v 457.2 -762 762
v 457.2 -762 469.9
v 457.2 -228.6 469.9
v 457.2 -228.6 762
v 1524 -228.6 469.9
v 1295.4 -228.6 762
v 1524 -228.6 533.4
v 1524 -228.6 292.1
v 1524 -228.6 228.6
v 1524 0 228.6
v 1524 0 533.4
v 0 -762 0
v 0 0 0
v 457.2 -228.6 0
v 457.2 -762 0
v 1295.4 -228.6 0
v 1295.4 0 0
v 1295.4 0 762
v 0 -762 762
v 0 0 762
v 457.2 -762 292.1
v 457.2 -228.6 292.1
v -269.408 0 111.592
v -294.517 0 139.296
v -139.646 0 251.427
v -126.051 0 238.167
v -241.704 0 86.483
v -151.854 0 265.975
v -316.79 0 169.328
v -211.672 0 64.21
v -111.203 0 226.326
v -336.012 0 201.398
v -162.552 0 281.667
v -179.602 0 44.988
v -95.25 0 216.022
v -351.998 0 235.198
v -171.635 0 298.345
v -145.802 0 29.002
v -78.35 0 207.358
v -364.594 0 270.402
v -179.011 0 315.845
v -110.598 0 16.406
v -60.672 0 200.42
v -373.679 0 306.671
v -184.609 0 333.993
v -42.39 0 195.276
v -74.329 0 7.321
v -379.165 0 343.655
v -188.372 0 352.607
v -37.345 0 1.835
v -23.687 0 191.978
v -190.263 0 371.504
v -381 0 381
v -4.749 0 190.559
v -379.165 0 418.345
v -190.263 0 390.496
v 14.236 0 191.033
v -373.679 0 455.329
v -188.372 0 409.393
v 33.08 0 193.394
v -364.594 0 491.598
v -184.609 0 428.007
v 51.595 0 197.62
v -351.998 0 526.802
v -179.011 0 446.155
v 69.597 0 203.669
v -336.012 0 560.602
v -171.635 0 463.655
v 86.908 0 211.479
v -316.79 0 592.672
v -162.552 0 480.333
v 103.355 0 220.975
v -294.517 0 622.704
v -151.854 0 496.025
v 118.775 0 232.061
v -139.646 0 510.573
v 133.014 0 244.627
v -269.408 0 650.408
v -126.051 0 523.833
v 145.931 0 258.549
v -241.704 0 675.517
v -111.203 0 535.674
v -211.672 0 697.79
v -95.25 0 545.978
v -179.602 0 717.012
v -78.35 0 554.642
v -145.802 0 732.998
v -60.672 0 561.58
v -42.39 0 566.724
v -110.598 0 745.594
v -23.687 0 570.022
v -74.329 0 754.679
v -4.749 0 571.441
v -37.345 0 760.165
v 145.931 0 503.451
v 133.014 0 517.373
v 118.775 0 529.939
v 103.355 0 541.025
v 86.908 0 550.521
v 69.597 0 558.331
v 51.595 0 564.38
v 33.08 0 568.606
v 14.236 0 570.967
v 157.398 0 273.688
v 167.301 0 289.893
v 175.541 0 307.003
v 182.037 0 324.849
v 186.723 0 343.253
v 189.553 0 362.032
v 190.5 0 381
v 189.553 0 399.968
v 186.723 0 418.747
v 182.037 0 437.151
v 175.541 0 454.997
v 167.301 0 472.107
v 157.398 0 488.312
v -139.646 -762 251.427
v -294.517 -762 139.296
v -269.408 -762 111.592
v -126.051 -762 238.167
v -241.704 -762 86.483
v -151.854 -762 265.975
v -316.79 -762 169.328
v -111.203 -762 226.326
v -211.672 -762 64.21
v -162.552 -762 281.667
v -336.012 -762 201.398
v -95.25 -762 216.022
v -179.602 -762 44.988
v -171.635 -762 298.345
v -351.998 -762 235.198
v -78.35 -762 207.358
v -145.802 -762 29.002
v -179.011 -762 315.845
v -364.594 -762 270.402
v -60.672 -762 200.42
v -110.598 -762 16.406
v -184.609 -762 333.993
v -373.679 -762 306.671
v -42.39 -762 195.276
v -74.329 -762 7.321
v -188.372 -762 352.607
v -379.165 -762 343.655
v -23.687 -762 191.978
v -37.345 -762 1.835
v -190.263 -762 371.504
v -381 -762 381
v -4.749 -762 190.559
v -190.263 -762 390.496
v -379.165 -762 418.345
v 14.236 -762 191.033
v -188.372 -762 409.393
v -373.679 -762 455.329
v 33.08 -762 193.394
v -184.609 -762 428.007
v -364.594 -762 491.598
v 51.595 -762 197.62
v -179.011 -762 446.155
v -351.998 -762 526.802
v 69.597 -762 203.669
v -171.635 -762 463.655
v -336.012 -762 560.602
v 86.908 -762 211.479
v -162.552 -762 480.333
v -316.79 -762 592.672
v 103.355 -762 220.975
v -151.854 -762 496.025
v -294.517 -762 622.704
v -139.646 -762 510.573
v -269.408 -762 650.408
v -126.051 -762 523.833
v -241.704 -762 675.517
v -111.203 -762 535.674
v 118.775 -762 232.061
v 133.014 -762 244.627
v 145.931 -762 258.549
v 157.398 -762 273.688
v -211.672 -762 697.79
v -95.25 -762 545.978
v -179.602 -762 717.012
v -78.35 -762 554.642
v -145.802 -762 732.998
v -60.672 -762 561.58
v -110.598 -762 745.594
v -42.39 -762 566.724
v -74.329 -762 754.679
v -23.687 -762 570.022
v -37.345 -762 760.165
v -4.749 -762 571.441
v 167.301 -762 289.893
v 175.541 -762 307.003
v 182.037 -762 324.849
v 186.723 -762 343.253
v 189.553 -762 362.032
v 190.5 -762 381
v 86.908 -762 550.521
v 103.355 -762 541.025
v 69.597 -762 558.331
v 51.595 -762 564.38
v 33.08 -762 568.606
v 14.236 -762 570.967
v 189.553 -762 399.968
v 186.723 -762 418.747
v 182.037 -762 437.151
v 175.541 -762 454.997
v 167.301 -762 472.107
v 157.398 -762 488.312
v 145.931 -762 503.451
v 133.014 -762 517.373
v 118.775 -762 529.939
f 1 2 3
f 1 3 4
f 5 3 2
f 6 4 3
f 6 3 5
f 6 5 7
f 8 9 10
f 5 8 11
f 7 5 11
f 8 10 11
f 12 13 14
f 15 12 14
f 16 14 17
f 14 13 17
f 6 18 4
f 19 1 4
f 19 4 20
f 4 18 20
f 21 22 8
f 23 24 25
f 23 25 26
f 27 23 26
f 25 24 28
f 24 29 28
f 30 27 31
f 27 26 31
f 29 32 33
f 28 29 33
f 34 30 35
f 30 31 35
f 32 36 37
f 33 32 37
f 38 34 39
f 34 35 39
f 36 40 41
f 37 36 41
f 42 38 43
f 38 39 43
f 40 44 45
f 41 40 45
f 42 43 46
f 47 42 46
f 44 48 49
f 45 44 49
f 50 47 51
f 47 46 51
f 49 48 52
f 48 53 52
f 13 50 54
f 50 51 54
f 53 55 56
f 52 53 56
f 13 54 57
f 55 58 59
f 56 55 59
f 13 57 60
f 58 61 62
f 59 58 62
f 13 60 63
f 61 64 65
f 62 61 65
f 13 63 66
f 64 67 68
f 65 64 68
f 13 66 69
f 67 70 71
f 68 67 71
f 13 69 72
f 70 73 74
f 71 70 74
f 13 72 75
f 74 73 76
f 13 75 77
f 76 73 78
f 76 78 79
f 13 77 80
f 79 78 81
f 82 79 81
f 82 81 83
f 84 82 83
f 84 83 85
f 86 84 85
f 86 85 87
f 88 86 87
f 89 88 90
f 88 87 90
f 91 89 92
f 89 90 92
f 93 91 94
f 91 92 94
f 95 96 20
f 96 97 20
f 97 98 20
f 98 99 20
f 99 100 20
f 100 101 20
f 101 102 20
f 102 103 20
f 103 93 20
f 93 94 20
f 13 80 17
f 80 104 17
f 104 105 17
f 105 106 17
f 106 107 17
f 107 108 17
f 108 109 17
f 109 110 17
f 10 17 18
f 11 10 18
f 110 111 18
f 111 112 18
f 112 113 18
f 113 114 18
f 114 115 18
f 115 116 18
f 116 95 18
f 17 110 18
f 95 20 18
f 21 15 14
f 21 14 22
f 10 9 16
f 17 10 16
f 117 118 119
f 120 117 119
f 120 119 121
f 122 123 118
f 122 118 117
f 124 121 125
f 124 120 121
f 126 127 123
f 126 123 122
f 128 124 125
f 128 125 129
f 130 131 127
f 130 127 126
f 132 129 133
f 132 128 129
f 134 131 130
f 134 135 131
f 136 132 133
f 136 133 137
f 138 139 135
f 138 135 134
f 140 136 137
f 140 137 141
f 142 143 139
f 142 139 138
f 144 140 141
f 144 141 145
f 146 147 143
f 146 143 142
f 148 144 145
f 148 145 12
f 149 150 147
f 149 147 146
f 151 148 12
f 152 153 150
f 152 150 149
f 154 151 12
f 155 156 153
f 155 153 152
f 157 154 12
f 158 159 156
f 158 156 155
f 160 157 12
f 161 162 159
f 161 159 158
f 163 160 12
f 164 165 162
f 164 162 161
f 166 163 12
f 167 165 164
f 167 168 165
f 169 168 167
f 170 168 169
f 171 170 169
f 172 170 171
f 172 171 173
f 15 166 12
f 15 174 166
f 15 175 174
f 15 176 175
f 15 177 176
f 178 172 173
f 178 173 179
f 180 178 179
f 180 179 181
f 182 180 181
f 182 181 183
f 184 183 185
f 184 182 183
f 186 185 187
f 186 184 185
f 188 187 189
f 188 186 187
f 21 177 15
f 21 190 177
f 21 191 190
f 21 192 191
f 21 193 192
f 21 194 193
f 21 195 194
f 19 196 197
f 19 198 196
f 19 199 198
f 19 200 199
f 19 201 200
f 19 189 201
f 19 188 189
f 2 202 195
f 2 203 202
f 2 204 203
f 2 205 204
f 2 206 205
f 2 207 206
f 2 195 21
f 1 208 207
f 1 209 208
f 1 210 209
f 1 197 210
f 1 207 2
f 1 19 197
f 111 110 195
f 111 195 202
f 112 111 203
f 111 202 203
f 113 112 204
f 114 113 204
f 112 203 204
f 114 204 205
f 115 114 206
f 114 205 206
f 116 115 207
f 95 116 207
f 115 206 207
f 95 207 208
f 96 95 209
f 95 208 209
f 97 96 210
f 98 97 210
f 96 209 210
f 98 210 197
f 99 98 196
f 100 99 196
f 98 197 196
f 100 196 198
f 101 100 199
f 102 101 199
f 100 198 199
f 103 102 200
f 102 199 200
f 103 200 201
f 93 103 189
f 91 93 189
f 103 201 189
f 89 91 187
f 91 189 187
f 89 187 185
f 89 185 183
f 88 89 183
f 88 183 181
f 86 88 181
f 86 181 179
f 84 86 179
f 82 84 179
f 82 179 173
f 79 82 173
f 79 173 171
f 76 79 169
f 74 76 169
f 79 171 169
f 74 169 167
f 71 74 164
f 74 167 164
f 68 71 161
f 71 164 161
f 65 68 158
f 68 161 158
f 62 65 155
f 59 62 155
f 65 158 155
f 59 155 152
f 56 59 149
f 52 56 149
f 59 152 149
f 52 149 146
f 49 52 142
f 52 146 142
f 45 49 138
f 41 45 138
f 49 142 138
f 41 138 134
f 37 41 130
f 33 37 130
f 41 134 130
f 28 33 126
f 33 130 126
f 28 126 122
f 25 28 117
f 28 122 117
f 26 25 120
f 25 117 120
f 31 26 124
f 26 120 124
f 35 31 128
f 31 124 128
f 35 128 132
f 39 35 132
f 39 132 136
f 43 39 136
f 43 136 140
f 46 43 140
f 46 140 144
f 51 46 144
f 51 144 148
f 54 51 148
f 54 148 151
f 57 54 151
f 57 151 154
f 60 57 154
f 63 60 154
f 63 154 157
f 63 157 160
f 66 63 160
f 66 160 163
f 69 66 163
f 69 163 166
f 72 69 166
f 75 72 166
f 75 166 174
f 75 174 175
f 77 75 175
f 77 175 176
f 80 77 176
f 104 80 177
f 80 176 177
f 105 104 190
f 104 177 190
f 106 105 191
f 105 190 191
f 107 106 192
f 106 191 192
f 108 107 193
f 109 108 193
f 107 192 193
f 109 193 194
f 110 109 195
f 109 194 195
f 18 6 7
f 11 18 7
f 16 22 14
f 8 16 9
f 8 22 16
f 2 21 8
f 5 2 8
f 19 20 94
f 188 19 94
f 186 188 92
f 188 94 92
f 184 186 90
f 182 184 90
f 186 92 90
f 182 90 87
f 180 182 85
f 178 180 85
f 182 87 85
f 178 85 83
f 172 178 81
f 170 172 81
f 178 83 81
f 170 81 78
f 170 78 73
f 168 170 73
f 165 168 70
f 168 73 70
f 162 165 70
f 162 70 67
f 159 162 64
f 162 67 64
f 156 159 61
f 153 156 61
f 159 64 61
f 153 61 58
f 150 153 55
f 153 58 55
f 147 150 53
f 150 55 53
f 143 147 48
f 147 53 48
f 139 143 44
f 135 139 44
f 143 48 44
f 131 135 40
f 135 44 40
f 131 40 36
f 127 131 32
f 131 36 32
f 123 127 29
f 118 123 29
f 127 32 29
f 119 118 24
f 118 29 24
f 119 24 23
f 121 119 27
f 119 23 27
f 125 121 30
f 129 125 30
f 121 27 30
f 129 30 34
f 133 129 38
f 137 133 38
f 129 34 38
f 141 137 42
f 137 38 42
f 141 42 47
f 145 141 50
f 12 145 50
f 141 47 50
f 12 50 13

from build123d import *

# Parameters (mm, degrees)
F1_DEPTH  = 762
F2_W      = 1066.8
F2_H      = 762
F3_DEPTH  = 533.4
F5_DEPTH  = 228.6
F6_W      = 1066.8
F6_H      = 177.8
F7_DEPTH  = 533.4
F9_DEPTH  = 254
F10_R     = 190.5
F11_DEPTH = 762


with BuildPart() as f1:
    # F0 (on Front) → F1 (new body)
    with BuildSketch(Plane.XZ):
        with BuildLine():
            Line((1524, 762), (0, 762))
            ThreePointArc((0, 762), (-381, 381), (0, 0))
            Line((0, 0), (1524, 0))
            Line((1524, 0), (1524, 762))
        make_face()
    extrude(amount=F1_DEPTH)

    # F2 (on face) → F3 (cut)
    with BuildSketch(Plane.XZ.offset(762)):
        with Locations((990.6, 381)):
            Rectangle(F2_W, F2_H)
    extrude(amount=-F3_DEPTH, mode=Mode.SUBTRACT)

    # F4 (on face) → F5 (cut)
    with BuildSketch(Plane.XZ.offset(228.6)):
        Polygon((1295.4, 0), (1524, 0), (1524, 228.6), align=None)
        Polygon((1295.4, 762), (1524, 533.4), (1524, 762), align=None)
    extrude(amount=-F5_DEPTH, mode=Mode.SUBTRACT)

    # F6 (on face) → F7 (join)
    with BuildSketch(Plane.XZ.offset(228.6)):
        with Locations((990.6, 381)):
            Rectangle(F6_W, F6_H)
    extrude(amount=F7_DEPTH)

    # F8 (on face) → F9 (cut)
    with BuildSketch(Plane(origin=(0, 0, 292.1), x_dir=(1, 0, 0), z_dir=(0, 0, -1))):
        Polygon((1524, 762), (457.2, 762), (1524, 228.6), align=None)
    extrude(amount=-F9_DEPTH, mode=Mode.SUBTRACT)

    # F10 (on face) → F11 (cut)
    with BuildSketch(Plane.XZ.offset(762)):
        with Locations((0, 381)):
            Circle(F10_R)
    extrude(amount=-F11_DEPTH, mode=Mode.SUBTRACT)


solid = f1.part
